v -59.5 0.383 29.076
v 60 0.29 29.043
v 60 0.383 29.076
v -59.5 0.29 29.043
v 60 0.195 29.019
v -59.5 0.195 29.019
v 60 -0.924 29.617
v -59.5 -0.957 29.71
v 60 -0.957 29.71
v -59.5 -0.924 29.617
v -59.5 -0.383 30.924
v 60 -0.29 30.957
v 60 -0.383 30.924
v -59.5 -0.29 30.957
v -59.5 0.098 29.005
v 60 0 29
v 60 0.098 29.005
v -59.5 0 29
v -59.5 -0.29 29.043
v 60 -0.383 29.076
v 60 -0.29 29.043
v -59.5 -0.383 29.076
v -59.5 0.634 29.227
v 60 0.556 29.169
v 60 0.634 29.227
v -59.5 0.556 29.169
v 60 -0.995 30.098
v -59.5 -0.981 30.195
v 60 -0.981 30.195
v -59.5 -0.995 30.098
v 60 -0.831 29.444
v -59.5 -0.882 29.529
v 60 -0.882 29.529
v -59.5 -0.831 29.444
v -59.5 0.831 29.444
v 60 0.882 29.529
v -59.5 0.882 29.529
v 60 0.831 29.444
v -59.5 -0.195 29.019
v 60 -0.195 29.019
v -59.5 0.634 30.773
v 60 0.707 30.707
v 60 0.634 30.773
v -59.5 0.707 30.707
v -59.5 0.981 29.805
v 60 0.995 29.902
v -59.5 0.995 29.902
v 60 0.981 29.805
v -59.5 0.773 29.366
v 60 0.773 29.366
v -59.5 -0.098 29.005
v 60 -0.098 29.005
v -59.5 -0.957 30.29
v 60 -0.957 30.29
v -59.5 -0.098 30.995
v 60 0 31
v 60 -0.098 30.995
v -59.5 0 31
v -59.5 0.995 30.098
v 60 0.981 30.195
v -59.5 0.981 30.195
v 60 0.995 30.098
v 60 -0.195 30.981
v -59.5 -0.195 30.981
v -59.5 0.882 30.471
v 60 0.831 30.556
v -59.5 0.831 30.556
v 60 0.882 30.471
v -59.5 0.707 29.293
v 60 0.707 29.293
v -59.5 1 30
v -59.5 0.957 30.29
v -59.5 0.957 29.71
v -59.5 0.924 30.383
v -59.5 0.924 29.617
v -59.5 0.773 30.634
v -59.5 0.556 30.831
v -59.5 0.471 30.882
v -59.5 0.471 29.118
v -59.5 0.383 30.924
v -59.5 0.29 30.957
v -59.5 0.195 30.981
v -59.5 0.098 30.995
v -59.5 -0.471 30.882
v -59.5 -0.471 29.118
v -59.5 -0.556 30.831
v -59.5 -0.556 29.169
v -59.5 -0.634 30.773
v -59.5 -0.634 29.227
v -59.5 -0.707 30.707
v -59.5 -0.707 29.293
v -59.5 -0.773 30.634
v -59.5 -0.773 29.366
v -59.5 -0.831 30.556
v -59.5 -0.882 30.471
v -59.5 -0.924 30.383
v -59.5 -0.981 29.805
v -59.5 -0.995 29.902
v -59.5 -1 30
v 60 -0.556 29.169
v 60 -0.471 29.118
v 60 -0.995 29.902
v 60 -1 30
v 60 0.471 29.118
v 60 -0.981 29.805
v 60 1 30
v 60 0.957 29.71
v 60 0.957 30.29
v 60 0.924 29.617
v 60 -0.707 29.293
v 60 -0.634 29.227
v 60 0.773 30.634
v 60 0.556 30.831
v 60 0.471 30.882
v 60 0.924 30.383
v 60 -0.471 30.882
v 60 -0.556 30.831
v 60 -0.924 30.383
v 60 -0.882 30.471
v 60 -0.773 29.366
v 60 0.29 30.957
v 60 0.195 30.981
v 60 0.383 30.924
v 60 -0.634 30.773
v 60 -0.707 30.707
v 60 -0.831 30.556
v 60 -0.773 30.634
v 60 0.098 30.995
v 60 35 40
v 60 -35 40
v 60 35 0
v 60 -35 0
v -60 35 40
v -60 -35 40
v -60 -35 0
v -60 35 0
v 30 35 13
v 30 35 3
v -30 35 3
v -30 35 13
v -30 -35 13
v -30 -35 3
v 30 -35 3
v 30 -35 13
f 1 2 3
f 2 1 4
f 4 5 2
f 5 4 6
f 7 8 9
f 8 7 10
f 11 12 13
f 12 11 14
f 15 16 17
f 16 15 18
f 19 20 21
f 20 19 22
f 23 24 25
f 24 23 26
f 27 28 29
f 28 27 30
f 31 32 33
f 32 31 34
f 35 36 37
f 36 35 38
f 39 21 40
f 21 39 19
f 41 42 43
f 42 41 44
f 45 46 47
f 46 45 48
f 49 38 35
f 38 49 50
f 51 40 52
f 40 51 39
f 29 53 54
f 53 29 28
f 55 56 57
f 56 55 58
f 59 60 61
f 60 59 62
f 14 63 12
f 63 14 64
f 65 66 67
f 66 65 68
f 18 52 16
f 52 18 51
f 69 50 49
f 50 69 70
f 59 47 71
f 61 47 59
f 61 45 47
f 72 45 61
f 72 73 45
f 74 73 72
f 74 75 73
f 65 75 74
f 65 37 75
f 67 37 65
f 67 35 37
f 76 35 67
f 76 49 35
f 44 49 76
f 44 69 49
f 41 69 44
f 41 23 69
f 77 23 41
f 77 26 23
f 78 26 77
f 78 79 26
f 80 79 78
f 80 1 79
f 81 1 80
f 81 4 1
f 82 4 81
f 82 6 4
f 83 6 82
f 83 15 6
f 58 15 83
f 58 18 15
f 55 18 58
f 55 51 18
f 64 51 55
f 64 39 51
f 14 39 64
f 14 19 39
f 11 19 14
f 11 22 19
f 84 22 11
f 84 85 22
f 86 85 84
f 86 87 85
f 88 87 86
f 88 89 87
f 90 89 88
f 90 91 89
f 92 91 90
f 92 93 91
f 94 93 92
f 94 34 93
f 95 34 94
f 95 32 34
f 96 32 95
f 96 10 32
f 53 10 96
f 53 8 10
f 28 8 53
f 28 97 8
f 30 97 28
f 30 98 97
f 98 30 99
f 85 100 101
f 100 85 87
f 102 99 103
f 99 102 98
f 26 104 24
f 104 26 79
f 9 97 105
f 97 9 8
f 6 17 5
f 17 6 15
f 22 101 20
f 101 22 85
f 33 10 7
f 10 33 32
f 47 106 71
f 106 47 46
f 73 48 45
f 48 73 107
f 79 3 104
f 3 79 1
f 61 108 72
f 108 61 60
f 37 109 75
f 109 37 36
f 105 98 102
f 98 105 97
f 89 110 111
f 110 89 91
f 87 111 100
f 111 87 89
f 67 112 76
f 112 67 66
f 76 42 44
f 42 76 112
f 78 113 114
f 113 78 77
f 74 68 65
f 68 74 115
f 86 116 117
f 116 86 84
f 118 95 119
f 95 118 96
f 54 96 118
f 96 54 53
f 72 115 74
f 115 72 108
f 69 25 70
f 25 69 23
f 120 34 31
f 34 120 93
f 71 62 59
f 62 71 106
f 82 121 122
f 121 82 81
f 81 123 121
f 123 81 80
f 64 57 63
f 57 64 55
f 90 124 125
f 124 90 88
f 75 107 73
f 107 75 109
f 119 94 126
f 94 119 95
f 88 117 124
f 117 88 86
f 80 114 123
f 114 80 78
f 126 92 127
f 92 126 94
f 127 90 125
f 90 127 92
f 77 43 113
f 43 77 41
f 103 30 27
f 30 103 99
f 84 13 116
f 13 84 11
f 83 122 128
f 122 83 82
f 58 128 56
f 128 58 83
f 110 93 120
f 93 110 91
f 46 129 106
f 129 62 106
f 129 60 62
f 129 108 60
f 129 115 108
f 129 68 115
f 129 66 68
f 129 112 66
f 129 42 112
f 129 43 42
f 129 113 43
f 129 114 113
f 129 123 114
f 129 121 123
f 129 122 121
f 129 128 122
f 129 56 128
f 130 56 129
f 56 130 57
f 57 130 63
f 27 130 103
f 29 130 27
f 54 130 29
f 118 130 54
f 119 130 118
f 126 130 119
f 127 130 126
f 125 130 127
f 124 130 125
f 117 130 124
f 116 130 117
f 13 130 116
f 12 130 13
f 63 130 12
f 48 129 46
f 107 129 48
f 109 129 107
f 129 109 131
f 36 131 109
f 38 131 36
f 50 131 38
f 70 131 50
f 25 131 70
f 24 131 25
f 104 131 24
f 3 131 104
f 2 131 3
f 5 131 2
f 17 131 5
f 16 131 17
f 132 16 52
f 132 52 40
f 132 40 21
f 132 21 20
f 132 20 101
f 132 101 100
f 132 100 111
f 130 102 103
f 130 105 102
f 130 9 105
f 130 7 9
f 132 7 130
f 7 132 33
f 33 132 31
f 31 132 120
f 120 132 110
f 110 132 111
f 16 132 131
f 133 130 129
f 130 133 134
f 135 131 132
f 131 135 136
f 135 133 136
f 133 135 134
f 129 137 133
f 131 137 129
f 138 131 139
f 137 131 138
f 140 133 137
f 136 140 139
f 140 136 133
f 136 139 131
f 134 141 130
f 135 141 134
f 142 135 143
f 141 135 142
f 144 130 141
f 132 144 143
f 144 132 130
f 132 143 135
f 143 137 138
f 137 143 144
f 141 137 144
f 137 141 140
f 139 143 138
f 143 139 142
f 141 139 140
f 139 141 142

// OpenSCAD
// Mini horizontal gel-electrophoresis buffer tank
// Print orientation: open top facing up, resting on XY plane at z = 0

// ---------------- Parameters ----------------
tank_x      = 120;   // outer length along X (mm)
tank_y      = 70;    // outer width along Y (mm)
tank_h      = 40;    // outer height along Z (mm)

wall        = 3;     // wall thickness (mm)
floor       = 3;     // floor thickness (mm)

platform_x  = 60;    // platform length along X (mm), centred
platform_y  = tank_y; // platform spans full inner width (mm)
platform_top = 13;   // platform top height above tank floor (mm)

hole_d      = 2;     // electrode hole diameter (mm)
hole_y      = 0;     // electrode hole Y position (mm)
hole_z      = 30;    // electrode hole Z position (mm)

eps         = 0.5;   // cutter overshoot past faces (mm)

$fn = 64;

// ---------------- Derived ----------------
inner_x = tank_x - 2 * wall;   // inner floor length along X
inner_y = tank_y - 2 * wall;   // inner width along Y
floor_t = floor;               // floor thickness under chambers
plat_t  = platform_top - floor_t; // platform thickness above floor

// ---------------- Model ----------------
difference() {
    // Main tank body (open top)
    translate([-tank_x / 2, -tank_y / 2, 0])
        cube([tank_x, tank_y, tank_h]);

    // Central raised platform for gel tray
    translate([-platform_x / 2, -platform_y / 2, floor_t])
        cube([platform_x, platform_y, plat_t]);

    // Horizontal electrode holes through each end wall along X
    for (s = [-1, 1])
        translate([s * (tank_x / 2 - eps), hole_y, hole_z])
            rotate([0, 90, 0])
                cylinder(d = hole_d, h = tank_x + 2 * eps);
}
